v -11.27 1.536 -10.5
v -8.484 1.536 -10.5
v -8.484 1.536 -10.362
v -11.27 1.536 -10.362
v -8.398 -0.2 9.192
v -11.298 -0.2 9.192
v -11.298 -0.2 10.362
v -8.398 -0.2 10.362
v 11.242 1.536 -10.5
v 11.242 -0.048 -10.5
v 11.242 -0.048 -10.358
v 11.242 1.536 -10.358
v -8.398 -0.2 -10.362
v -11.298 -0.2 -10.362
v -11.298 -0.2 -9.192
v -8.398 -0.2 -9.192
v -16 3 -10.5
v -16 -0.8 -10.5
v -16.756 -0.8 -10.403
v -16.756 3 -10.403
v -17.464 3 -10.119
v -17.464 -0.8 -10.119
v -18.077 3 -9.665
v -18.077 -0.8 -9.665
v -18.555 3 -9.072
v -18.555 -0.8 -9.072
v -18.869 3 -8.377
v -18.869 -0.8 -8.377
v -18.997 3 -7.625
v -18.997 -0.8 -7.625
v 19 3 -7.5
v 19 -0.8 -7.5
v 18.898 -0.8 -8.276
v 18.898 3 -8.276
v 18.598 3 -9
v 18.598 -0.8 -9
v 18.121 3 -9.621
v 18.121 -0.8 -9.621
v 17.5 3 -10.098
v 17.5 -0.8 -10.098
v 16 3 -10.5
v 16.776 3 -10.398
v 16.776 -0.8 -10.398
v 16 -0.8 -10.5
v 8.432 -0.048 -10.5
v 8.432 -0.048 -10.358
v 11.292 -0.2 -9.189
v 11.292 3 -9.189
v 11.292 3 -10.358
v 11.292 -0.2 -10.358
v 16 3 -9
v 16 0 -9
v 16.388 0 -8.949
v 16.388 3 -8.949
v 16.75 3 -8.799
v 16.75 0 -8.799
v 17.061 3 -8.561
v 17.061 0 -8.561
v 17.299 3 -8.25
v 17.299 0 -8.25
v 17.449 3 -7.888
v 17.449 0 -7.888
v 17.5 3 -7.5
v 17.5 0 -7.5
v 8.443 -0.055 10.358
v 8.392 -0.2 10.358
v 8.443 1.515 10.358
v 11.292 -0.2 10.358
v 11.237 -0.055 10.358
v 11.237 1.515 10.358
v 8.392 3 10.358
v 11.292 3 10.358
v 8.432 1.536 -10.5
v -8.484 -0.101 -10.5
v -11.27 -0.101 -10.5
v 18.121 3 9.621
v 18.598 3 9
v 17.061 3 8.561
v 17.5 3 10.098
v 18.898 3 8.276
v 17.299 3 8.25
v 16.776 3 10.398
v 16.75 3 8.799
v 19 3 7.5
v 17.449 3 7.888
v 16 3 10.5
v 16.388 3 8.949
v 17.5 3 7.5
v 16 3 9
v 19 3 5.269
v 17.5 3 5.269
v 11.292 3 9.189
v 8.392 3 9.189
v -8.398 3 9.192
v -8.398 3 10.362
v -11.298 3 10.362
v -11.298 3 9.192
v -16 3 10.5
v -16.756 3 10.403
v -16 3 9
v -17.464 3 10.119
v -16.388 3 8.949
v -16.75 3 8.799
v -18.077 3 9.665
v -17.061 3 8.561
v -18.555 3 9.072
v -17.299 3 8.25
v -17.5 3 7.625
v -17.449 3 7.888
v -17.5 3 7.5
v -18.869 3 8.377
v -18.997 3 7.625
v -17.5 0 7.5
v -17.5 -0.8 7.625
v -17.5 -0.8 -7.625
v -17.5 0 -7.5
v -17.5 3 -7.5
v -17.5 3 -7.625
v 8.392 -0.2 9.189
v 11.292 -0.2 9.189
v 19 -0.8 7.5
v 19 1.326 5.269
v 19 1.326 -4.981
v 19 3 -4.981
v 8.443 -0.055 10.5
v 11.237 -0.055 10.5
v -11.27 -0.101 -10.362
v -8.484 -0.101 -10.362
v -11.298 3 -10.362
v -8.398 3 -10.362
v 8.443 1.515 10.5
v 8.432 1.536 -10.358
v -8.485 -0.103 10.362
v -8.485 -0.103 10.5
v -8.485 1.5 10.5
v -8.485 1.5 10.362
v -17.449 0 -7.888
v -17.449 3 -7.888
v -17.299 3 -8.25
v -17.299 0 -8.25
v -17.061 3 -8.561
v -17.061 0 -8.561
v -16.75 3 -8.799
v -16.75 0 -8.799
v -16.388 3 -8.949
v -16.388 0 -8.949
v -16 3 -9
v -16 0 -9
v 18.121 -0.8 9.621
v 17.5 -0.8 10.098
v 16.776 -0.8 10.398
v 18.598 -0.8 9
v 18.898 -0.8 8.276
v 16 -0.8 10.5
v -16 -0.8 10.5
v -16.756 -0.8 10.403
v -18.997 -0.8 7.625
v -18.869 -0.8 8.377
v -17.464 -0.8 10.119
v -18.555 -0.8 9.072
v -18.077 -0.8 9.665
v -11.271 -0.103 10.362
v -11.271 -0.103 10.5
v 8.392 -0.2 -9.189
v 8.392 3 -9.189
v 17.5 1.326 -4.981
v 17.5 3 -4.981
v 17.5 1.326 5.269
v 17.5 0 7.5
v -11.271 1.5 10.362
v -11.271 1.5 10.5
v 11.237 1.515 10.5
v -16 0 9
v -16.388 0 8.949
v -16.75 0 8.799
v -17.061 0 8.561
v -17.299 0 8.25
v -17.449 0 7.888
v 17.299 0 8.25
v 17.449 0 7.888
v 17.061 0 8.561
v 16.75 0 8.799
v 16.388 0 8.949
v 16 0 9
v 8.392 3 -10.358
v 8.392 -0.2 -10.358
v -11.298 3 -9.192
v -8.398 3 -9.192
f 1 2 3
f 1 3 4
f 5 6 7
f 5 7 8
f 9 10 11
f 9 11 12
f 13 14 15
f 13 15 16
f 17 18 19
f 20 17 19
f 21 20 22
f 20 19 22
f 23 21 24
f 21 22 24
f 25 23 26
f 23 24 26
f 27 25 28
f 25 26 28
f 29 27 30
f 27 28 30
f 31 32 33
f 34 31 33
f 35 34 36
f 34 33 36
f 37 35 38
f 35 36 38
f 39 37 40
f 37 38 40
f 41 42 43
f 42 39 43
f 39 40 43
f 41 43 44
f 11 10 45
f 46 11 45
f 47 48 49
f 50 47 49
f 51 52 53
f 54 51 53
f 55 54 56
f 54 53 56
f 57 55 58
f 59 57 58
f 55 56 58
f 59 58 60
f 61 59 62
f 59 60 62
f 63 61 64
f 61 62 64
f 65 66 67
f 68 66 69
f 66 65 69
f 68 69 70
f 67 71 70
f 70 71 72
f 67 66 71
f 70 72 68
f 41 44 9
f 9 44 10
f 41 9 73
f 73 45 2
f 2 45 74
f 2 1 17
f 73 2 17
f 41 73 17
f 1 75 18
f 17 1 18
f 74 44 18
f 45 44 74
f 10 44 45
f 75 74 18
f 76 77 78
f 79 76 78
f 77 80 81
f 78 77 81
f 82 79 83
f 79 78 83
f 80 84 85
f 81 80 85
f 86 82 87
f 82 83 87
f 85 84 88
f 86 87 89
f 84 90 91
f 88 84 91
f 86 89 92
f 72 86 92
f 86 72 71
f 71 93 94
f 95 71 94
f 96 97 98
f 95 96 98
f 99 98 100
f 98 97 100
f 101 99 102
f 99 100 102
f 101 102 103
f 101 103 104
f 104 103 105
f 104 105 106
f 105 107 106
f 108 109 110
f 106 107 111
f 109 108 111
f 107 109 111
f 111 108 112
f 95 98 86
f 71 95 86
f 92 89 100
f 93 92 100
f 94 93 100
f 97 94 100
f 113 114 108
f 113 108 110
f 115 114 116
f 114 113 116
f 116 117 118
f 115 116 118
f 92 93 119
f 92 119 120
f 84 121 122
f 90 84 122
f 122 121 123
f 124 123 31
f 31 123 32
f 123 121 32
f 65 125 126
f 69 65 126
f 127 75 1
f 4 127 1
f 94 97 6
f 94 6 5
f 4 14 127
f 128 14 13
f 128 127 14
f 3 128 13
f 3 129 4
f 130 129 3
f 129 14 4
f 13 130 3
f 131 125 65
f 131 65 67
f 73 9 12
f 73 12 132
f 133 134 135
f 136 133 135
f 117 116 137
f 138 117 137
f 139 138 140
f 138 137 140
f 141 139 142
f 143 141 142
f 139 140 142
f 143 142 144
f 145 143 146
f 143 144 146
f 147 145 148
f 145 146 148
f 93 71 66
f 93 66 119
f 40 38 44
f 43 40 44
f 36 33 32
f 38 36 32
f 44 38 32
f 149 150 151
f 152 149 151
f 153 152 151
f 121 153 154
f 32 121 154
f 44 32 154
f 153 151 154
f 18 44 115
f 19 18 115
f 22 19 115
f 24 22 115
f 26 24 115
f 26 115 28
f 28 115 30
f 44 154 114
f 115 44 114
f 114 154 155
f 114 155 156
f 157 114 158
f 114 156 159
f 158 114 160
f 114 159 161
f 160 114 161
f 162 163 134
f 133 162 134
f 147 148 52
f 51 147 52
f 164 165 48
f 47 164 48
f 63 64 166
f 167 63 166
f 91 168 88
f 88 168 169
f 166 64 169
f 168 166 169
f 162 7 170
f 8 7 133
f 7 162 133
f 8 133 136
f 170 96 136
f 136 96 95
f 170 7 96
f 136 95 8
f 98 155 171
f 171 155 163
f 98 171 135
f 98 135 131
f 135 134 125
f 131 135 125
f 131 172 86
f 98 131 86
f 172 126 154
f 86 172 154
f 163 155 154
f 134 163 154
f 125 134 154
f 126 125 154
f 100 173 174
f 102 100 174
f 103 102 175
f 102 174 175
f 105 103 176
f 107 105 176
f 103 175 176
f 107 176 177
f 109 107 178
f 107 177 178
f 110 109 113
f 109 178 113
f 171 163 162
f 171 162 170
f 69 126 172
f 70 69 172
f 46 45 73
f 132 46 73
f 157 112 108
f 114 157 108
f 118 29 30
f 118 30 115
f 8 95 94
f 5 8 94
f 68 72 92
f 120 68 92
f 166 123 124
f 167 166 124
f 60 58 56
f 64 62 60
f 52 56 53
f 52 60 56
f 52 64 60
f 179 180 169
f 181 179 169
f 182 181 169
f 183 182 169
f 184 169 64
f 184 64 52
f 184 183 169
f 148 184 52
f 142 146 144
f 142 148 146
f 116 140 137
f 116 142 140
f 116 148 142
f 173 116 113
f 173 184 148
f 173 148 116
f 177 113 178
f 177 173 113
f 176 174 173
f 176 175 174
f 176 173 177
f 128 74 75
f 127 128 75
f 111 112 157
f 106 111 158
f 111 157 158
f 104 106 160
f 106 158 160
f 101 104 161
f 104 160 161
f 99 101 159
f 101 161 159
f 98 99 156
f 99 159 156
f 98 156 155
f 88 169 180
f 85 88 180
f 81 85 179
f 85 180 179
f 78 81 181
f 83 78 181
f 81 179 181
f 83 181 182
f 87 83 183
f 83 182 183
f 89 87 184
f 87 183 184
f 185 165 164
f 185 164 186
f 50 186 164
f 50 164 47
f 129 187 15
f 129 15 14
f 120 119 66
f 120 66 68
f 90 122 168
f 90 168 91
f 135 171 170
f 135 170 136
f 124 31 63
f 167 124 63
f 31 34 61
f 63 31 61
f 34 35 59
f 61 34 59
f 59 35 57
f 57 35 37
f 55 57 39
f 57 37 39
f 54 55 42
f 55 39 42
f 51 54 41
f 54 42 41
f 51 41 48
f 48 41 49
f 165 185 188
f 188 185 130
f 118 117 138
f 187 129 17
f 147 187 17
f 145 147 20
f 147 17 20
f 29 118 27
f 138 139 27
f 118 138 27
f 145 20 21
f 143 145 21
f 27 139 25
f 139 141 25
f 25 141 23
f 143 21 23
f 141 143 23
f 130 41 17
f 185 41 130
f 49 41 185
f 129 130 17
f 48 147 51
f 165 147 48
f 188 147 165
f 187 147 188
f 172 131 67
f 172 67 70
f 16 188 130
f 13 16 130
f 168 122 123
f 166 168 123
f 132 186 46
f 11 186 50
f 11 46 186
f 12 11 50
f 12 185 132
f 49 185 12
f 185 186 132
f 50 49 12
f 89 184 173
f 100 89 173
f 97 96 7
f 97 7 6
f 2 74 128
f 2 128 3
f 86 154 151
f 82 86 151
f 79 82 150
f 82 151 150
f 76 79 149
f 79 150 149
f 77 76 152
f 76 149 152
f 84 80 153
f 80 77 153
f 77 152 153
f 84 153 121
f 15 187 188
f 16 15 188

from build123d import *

# Parameters (mm, degrees)
EXTRUDE_3_DEPTH     = 3
EXTRUDE_START       = 0.8
EXTRUDE_4_DEPTH     = 0.8
SKETCH_4_W          = 3
SKETCH_4_H          = 15.25
CUT_EXTRUDE_1_DEPTH = 4
SKETCH_5_W          = 10.25
SKETCH_5_H          = 3.645381057
CUT_EXTRUDE_2_DEPTH = 3
SKETCH_6_W          = 2.899645865
SKETCH_6_H          = 1.169365381
SKETCH_6_H_2        = 1.169365382
CUT_EXTRUDE_3_DEPTH = 3.2
CUT_EXTRUDE_5_REACH = 30.478
SKETCH_7_W          = 2.785841709
SKETCH_7_H          = 1.637134251
SKETCH_7_W_2        = 2.809808384
SKETCH_7_H_2        = 1.583820861
CUT_EXTRUDE_6_REACH = 30.478
SKETCH_8_W          = 2.793582113
SKETCH_8_H          = 1.569963741
SKETCH_8_W_2        = 2.785085694
SKETCH_8_H_2        = 1.60265935


with BuildPart() as part:
    # 草图1 → 凸台-拉伸3 (new body)
    with BuildSketch(Plane(origin=(0, 0, 0), x_dir=(1, 0, 0), z_dir=(0, 1, 0))):
        with BuildLine():
            Line((-16, 10.5), (16, 10.5))
            ThreePointArc((16, 10.5), (18.121320344, 9.621320344), (19, 7.5))
            Line((19, 7.5), (19, -7.5))
            ThreePointArc((19, -7.5), (18.121320344, -9.621320344), (16, -10.5))
            Line((16, -10.5), (-16, -10.5))
            ThreePointArc((-16, -10.5), (-18.121320344, -9.621320344), (-19, -7.5))
            Line((-19, -7.5), (-19, 7.5))
            ThreePointArc((-19, 7.5), (-18.121320344, 9.621320344), (-16, 10.5))
        make_face()
        with BuildLine():
            Line((-16, 9), (16, 9))
            ThreePointArc((16, 9), (17.060660172, 8.560660172), (17.5, 7.5))
            Line((17.5, 7.5), (17.5, -7.5))
            ThreePointArc((17.5, -7.5), (17.060660172, -8.560660172), (16, -9))
            Line((16, -9), (-16, -9))
            ThreePointArc((-16, -9), (-17.060660172, -8.560660172), (-17.5, -7.5))
            Line((-17.5, -7.5), (-17.5, 7.5))
            ThreePointArc((-17.5, 7.5), (-17.060660172, 8.560660172), (-16, 9))
        make_face(mode=Mode.SUBTRACT)
    extrude(amount=EXTRUDE_3_DEPTH)

    # 草图3 → 凸台-拉伸4 (add)
    with BuildSketch(Plane.XZ.offset(EXTRUDE_START)):
        with BuildLine():
            Line((-16, 10.5), (16, 10.5))
            ThreePointArc((16, 10.5), (18.121320344, 9.621320344), (19, 7.5))
            Line((19, 7.5), (19, -7.5))
            ThreePointArc((19, -7.5), (18.121320344, -9.621320344), (16, -10.5))
            Line((16, -10.5), (-16, -10.5))
            ThreePointArc((-16, -10.5), (-18.121320344, -9.621320344), (-19, -7.5))
            Line((-19, -7.5), (-19, 7.5))
            ThreePointArc((-19, 7.5), (-18.121320344, 9.621320344), (-16, 10.5))
        make_face()
    extrude(amount=-EXTRUDE_4_DEPTH)

    # 草图4 → 切除-拉伸1 (cut)
    with BuildSketch(Plane(origin=(0, 3, 0), x_dir=(1, 0, 0), z_dir=(0, 1, 0))):
        with Locations((-19, 0)):
            Rectangle(SKETCH_4_W, SKETCH_4_H)
    extrude(amount=-CUT_EXTRUDE_1_DEPTH, mode=Mode.SUBTRACT)

    # 草图5 → 切除-拉伸2 (cut)
    with BuildSketch(Plane(origin=(19, 0, 0), x_dir=(0, 0, -1), z_dir=(1, 0, 0))):
        with Locations((-0.144, 3.148589472)):
            Rectangle(SKETCH_5_W, SKETCH_5_H)
    extrude(amount=-CUT_EXTRUDE_2_DEPTH, mode=Mode.SUBTRACT)

    # 草图6 → 切除-拉伸3 (cut)
    with BuildSketch(Plane(origin=(0, 3, 0), x_dir=(1, 0, 0), z_dir=(0, 1, 0))):
        with Locations((9.842196581, -9.77321518)):
            Rectangle(SKETCH_6_W, SKETCH_6_H)
        with Locations((-9.847989742, -9.777101279)):
            Rectangle(SKETCH_6_W, SKETCH_6_H_2)
        with Locations((9.842196581, 9.77321518)):
            Rectangle(SKETCH_6_W, SKETCH_6_H)
        with Locations((-9.847989742, 9.777101279)):
            Rectangle(SKETCH_6_W, SKETCH_6_H_2)
    extrude(amount=-CUT_EXTRUDE_3_DEPTH, mode=Mode.SUBTRACT)

    # 切除-拉伸5: up to this face of the body (flat: up to its plane)
    cut_extrude_5_end = Plane(part.part.faces().sort_by_distance((9.84219658, 1.4, -10.357897871))[0])
    # 草图7 → 切除-拉伸5 (cut, up to the picked face)
    with BuildSketch(Plane(origin=(0, 0, -10.5), x_dir=(-1, 0, 0), z_dir=(0, 0, -1)), mode=Mode.PRIVATE) as cut_extrude_5_sk1:
        with Locations((9.877407398, 0.717488498)):
            Rectangle(SKETCH_7_W, SKETCH_7_H)
    cut_extrude_5_tool1 = split(extrude(cut_extrude_5_sk1.sketch, amount=-CUT_EXTRUDE_5_REACH, mode=Mode.PRIVATE), bisect_by=cut_extrude_5_end, keep=Keep.BOTH, mode=Mode.PRIVATE)
    # 草图7 → 切除-拉伸5 (cut, up to the picked face)
    with BuildSketch(Plane(origin=(0, 0, -10.5), x_dir=(-1, 0, 0), z_dir=(0, 0, -1)), mode=Mode.PRIVATE) as cut_extrude_5_sk2:
        with Locations((-9.836726154, 0.744145193)):
            Rectangle(SKETCH_7_W_2, SKETCH_7_H_2)
    cut_extrude_5_tool2 = split(extrude(cut_extrude_5_sk2.sketch, amount=-CUT_EXTRUDE_5_REACH, mode=Mode.PRIVATE), bisect_by=cut_extrude_5_end, keep=Keep.BOTH, mode=Mode.PRIVATE)
    add(cut_extrude_5_tool1.solids().sort_by(Axis((-9.877407, 0.717488, -10.5), (0, 0, 1)))[0], mode=Mode.SUBTRACT)
    add(cut_extrude_5_tool2.solids().sort_by(Axis((9.836726, 0.744145, -10.5), (0, 0, 1)))[0], mode=Mode.SUBTRACT)

    # 草图8 → 切除-拉伸6 (cut, up to next)
    with BuildSketch(Plane.XY.offset(10.5), mode=Mode.PRIVATE) as cut_extrude_6_sk1:
        with Locations((9.840094375, 0.730022081)):
            Rectangle(SKETCH_8_W, SKETCH_8_H)
    cut_extrude_6_tool1 = extrude(cut_extrude_6_sk1.sketch, amount=-CUT_EXTRUDE_6_REACH, mode=Mode.PRIVATE) & part.part
    # 草图8 → 切除-拉伸6 (cut, up to next)
    with BuildSketch(Plane.XY.offset(10.5), mode=Mode.PRIVATE) as cut_extrude_6_sk2:
        with Locations((-9.878038676, 0.698670325)):
            Rectangle(SKETCH_8_W_2, SKETCH_8_H_2)
    cut_extrude_6_tool2 = extrude(cut_extrude_6_sk2.sketch, amount=-CUT_EXTRUDE_6_REACH, mode=Mode.PRIVATE) & part.part
    add(cut_extrude_6_tool1.solids().sort_by_distance((9.840094, 0.730022, 10.5))[0], mode=Mode.SUBTRACT)
    add(cut_extrude_6_tool2.solids().sort_by_distance((-9.878039, 0.69867, 10.5))[0], mode=Mode.SUBTRACT)


solid = part.part
